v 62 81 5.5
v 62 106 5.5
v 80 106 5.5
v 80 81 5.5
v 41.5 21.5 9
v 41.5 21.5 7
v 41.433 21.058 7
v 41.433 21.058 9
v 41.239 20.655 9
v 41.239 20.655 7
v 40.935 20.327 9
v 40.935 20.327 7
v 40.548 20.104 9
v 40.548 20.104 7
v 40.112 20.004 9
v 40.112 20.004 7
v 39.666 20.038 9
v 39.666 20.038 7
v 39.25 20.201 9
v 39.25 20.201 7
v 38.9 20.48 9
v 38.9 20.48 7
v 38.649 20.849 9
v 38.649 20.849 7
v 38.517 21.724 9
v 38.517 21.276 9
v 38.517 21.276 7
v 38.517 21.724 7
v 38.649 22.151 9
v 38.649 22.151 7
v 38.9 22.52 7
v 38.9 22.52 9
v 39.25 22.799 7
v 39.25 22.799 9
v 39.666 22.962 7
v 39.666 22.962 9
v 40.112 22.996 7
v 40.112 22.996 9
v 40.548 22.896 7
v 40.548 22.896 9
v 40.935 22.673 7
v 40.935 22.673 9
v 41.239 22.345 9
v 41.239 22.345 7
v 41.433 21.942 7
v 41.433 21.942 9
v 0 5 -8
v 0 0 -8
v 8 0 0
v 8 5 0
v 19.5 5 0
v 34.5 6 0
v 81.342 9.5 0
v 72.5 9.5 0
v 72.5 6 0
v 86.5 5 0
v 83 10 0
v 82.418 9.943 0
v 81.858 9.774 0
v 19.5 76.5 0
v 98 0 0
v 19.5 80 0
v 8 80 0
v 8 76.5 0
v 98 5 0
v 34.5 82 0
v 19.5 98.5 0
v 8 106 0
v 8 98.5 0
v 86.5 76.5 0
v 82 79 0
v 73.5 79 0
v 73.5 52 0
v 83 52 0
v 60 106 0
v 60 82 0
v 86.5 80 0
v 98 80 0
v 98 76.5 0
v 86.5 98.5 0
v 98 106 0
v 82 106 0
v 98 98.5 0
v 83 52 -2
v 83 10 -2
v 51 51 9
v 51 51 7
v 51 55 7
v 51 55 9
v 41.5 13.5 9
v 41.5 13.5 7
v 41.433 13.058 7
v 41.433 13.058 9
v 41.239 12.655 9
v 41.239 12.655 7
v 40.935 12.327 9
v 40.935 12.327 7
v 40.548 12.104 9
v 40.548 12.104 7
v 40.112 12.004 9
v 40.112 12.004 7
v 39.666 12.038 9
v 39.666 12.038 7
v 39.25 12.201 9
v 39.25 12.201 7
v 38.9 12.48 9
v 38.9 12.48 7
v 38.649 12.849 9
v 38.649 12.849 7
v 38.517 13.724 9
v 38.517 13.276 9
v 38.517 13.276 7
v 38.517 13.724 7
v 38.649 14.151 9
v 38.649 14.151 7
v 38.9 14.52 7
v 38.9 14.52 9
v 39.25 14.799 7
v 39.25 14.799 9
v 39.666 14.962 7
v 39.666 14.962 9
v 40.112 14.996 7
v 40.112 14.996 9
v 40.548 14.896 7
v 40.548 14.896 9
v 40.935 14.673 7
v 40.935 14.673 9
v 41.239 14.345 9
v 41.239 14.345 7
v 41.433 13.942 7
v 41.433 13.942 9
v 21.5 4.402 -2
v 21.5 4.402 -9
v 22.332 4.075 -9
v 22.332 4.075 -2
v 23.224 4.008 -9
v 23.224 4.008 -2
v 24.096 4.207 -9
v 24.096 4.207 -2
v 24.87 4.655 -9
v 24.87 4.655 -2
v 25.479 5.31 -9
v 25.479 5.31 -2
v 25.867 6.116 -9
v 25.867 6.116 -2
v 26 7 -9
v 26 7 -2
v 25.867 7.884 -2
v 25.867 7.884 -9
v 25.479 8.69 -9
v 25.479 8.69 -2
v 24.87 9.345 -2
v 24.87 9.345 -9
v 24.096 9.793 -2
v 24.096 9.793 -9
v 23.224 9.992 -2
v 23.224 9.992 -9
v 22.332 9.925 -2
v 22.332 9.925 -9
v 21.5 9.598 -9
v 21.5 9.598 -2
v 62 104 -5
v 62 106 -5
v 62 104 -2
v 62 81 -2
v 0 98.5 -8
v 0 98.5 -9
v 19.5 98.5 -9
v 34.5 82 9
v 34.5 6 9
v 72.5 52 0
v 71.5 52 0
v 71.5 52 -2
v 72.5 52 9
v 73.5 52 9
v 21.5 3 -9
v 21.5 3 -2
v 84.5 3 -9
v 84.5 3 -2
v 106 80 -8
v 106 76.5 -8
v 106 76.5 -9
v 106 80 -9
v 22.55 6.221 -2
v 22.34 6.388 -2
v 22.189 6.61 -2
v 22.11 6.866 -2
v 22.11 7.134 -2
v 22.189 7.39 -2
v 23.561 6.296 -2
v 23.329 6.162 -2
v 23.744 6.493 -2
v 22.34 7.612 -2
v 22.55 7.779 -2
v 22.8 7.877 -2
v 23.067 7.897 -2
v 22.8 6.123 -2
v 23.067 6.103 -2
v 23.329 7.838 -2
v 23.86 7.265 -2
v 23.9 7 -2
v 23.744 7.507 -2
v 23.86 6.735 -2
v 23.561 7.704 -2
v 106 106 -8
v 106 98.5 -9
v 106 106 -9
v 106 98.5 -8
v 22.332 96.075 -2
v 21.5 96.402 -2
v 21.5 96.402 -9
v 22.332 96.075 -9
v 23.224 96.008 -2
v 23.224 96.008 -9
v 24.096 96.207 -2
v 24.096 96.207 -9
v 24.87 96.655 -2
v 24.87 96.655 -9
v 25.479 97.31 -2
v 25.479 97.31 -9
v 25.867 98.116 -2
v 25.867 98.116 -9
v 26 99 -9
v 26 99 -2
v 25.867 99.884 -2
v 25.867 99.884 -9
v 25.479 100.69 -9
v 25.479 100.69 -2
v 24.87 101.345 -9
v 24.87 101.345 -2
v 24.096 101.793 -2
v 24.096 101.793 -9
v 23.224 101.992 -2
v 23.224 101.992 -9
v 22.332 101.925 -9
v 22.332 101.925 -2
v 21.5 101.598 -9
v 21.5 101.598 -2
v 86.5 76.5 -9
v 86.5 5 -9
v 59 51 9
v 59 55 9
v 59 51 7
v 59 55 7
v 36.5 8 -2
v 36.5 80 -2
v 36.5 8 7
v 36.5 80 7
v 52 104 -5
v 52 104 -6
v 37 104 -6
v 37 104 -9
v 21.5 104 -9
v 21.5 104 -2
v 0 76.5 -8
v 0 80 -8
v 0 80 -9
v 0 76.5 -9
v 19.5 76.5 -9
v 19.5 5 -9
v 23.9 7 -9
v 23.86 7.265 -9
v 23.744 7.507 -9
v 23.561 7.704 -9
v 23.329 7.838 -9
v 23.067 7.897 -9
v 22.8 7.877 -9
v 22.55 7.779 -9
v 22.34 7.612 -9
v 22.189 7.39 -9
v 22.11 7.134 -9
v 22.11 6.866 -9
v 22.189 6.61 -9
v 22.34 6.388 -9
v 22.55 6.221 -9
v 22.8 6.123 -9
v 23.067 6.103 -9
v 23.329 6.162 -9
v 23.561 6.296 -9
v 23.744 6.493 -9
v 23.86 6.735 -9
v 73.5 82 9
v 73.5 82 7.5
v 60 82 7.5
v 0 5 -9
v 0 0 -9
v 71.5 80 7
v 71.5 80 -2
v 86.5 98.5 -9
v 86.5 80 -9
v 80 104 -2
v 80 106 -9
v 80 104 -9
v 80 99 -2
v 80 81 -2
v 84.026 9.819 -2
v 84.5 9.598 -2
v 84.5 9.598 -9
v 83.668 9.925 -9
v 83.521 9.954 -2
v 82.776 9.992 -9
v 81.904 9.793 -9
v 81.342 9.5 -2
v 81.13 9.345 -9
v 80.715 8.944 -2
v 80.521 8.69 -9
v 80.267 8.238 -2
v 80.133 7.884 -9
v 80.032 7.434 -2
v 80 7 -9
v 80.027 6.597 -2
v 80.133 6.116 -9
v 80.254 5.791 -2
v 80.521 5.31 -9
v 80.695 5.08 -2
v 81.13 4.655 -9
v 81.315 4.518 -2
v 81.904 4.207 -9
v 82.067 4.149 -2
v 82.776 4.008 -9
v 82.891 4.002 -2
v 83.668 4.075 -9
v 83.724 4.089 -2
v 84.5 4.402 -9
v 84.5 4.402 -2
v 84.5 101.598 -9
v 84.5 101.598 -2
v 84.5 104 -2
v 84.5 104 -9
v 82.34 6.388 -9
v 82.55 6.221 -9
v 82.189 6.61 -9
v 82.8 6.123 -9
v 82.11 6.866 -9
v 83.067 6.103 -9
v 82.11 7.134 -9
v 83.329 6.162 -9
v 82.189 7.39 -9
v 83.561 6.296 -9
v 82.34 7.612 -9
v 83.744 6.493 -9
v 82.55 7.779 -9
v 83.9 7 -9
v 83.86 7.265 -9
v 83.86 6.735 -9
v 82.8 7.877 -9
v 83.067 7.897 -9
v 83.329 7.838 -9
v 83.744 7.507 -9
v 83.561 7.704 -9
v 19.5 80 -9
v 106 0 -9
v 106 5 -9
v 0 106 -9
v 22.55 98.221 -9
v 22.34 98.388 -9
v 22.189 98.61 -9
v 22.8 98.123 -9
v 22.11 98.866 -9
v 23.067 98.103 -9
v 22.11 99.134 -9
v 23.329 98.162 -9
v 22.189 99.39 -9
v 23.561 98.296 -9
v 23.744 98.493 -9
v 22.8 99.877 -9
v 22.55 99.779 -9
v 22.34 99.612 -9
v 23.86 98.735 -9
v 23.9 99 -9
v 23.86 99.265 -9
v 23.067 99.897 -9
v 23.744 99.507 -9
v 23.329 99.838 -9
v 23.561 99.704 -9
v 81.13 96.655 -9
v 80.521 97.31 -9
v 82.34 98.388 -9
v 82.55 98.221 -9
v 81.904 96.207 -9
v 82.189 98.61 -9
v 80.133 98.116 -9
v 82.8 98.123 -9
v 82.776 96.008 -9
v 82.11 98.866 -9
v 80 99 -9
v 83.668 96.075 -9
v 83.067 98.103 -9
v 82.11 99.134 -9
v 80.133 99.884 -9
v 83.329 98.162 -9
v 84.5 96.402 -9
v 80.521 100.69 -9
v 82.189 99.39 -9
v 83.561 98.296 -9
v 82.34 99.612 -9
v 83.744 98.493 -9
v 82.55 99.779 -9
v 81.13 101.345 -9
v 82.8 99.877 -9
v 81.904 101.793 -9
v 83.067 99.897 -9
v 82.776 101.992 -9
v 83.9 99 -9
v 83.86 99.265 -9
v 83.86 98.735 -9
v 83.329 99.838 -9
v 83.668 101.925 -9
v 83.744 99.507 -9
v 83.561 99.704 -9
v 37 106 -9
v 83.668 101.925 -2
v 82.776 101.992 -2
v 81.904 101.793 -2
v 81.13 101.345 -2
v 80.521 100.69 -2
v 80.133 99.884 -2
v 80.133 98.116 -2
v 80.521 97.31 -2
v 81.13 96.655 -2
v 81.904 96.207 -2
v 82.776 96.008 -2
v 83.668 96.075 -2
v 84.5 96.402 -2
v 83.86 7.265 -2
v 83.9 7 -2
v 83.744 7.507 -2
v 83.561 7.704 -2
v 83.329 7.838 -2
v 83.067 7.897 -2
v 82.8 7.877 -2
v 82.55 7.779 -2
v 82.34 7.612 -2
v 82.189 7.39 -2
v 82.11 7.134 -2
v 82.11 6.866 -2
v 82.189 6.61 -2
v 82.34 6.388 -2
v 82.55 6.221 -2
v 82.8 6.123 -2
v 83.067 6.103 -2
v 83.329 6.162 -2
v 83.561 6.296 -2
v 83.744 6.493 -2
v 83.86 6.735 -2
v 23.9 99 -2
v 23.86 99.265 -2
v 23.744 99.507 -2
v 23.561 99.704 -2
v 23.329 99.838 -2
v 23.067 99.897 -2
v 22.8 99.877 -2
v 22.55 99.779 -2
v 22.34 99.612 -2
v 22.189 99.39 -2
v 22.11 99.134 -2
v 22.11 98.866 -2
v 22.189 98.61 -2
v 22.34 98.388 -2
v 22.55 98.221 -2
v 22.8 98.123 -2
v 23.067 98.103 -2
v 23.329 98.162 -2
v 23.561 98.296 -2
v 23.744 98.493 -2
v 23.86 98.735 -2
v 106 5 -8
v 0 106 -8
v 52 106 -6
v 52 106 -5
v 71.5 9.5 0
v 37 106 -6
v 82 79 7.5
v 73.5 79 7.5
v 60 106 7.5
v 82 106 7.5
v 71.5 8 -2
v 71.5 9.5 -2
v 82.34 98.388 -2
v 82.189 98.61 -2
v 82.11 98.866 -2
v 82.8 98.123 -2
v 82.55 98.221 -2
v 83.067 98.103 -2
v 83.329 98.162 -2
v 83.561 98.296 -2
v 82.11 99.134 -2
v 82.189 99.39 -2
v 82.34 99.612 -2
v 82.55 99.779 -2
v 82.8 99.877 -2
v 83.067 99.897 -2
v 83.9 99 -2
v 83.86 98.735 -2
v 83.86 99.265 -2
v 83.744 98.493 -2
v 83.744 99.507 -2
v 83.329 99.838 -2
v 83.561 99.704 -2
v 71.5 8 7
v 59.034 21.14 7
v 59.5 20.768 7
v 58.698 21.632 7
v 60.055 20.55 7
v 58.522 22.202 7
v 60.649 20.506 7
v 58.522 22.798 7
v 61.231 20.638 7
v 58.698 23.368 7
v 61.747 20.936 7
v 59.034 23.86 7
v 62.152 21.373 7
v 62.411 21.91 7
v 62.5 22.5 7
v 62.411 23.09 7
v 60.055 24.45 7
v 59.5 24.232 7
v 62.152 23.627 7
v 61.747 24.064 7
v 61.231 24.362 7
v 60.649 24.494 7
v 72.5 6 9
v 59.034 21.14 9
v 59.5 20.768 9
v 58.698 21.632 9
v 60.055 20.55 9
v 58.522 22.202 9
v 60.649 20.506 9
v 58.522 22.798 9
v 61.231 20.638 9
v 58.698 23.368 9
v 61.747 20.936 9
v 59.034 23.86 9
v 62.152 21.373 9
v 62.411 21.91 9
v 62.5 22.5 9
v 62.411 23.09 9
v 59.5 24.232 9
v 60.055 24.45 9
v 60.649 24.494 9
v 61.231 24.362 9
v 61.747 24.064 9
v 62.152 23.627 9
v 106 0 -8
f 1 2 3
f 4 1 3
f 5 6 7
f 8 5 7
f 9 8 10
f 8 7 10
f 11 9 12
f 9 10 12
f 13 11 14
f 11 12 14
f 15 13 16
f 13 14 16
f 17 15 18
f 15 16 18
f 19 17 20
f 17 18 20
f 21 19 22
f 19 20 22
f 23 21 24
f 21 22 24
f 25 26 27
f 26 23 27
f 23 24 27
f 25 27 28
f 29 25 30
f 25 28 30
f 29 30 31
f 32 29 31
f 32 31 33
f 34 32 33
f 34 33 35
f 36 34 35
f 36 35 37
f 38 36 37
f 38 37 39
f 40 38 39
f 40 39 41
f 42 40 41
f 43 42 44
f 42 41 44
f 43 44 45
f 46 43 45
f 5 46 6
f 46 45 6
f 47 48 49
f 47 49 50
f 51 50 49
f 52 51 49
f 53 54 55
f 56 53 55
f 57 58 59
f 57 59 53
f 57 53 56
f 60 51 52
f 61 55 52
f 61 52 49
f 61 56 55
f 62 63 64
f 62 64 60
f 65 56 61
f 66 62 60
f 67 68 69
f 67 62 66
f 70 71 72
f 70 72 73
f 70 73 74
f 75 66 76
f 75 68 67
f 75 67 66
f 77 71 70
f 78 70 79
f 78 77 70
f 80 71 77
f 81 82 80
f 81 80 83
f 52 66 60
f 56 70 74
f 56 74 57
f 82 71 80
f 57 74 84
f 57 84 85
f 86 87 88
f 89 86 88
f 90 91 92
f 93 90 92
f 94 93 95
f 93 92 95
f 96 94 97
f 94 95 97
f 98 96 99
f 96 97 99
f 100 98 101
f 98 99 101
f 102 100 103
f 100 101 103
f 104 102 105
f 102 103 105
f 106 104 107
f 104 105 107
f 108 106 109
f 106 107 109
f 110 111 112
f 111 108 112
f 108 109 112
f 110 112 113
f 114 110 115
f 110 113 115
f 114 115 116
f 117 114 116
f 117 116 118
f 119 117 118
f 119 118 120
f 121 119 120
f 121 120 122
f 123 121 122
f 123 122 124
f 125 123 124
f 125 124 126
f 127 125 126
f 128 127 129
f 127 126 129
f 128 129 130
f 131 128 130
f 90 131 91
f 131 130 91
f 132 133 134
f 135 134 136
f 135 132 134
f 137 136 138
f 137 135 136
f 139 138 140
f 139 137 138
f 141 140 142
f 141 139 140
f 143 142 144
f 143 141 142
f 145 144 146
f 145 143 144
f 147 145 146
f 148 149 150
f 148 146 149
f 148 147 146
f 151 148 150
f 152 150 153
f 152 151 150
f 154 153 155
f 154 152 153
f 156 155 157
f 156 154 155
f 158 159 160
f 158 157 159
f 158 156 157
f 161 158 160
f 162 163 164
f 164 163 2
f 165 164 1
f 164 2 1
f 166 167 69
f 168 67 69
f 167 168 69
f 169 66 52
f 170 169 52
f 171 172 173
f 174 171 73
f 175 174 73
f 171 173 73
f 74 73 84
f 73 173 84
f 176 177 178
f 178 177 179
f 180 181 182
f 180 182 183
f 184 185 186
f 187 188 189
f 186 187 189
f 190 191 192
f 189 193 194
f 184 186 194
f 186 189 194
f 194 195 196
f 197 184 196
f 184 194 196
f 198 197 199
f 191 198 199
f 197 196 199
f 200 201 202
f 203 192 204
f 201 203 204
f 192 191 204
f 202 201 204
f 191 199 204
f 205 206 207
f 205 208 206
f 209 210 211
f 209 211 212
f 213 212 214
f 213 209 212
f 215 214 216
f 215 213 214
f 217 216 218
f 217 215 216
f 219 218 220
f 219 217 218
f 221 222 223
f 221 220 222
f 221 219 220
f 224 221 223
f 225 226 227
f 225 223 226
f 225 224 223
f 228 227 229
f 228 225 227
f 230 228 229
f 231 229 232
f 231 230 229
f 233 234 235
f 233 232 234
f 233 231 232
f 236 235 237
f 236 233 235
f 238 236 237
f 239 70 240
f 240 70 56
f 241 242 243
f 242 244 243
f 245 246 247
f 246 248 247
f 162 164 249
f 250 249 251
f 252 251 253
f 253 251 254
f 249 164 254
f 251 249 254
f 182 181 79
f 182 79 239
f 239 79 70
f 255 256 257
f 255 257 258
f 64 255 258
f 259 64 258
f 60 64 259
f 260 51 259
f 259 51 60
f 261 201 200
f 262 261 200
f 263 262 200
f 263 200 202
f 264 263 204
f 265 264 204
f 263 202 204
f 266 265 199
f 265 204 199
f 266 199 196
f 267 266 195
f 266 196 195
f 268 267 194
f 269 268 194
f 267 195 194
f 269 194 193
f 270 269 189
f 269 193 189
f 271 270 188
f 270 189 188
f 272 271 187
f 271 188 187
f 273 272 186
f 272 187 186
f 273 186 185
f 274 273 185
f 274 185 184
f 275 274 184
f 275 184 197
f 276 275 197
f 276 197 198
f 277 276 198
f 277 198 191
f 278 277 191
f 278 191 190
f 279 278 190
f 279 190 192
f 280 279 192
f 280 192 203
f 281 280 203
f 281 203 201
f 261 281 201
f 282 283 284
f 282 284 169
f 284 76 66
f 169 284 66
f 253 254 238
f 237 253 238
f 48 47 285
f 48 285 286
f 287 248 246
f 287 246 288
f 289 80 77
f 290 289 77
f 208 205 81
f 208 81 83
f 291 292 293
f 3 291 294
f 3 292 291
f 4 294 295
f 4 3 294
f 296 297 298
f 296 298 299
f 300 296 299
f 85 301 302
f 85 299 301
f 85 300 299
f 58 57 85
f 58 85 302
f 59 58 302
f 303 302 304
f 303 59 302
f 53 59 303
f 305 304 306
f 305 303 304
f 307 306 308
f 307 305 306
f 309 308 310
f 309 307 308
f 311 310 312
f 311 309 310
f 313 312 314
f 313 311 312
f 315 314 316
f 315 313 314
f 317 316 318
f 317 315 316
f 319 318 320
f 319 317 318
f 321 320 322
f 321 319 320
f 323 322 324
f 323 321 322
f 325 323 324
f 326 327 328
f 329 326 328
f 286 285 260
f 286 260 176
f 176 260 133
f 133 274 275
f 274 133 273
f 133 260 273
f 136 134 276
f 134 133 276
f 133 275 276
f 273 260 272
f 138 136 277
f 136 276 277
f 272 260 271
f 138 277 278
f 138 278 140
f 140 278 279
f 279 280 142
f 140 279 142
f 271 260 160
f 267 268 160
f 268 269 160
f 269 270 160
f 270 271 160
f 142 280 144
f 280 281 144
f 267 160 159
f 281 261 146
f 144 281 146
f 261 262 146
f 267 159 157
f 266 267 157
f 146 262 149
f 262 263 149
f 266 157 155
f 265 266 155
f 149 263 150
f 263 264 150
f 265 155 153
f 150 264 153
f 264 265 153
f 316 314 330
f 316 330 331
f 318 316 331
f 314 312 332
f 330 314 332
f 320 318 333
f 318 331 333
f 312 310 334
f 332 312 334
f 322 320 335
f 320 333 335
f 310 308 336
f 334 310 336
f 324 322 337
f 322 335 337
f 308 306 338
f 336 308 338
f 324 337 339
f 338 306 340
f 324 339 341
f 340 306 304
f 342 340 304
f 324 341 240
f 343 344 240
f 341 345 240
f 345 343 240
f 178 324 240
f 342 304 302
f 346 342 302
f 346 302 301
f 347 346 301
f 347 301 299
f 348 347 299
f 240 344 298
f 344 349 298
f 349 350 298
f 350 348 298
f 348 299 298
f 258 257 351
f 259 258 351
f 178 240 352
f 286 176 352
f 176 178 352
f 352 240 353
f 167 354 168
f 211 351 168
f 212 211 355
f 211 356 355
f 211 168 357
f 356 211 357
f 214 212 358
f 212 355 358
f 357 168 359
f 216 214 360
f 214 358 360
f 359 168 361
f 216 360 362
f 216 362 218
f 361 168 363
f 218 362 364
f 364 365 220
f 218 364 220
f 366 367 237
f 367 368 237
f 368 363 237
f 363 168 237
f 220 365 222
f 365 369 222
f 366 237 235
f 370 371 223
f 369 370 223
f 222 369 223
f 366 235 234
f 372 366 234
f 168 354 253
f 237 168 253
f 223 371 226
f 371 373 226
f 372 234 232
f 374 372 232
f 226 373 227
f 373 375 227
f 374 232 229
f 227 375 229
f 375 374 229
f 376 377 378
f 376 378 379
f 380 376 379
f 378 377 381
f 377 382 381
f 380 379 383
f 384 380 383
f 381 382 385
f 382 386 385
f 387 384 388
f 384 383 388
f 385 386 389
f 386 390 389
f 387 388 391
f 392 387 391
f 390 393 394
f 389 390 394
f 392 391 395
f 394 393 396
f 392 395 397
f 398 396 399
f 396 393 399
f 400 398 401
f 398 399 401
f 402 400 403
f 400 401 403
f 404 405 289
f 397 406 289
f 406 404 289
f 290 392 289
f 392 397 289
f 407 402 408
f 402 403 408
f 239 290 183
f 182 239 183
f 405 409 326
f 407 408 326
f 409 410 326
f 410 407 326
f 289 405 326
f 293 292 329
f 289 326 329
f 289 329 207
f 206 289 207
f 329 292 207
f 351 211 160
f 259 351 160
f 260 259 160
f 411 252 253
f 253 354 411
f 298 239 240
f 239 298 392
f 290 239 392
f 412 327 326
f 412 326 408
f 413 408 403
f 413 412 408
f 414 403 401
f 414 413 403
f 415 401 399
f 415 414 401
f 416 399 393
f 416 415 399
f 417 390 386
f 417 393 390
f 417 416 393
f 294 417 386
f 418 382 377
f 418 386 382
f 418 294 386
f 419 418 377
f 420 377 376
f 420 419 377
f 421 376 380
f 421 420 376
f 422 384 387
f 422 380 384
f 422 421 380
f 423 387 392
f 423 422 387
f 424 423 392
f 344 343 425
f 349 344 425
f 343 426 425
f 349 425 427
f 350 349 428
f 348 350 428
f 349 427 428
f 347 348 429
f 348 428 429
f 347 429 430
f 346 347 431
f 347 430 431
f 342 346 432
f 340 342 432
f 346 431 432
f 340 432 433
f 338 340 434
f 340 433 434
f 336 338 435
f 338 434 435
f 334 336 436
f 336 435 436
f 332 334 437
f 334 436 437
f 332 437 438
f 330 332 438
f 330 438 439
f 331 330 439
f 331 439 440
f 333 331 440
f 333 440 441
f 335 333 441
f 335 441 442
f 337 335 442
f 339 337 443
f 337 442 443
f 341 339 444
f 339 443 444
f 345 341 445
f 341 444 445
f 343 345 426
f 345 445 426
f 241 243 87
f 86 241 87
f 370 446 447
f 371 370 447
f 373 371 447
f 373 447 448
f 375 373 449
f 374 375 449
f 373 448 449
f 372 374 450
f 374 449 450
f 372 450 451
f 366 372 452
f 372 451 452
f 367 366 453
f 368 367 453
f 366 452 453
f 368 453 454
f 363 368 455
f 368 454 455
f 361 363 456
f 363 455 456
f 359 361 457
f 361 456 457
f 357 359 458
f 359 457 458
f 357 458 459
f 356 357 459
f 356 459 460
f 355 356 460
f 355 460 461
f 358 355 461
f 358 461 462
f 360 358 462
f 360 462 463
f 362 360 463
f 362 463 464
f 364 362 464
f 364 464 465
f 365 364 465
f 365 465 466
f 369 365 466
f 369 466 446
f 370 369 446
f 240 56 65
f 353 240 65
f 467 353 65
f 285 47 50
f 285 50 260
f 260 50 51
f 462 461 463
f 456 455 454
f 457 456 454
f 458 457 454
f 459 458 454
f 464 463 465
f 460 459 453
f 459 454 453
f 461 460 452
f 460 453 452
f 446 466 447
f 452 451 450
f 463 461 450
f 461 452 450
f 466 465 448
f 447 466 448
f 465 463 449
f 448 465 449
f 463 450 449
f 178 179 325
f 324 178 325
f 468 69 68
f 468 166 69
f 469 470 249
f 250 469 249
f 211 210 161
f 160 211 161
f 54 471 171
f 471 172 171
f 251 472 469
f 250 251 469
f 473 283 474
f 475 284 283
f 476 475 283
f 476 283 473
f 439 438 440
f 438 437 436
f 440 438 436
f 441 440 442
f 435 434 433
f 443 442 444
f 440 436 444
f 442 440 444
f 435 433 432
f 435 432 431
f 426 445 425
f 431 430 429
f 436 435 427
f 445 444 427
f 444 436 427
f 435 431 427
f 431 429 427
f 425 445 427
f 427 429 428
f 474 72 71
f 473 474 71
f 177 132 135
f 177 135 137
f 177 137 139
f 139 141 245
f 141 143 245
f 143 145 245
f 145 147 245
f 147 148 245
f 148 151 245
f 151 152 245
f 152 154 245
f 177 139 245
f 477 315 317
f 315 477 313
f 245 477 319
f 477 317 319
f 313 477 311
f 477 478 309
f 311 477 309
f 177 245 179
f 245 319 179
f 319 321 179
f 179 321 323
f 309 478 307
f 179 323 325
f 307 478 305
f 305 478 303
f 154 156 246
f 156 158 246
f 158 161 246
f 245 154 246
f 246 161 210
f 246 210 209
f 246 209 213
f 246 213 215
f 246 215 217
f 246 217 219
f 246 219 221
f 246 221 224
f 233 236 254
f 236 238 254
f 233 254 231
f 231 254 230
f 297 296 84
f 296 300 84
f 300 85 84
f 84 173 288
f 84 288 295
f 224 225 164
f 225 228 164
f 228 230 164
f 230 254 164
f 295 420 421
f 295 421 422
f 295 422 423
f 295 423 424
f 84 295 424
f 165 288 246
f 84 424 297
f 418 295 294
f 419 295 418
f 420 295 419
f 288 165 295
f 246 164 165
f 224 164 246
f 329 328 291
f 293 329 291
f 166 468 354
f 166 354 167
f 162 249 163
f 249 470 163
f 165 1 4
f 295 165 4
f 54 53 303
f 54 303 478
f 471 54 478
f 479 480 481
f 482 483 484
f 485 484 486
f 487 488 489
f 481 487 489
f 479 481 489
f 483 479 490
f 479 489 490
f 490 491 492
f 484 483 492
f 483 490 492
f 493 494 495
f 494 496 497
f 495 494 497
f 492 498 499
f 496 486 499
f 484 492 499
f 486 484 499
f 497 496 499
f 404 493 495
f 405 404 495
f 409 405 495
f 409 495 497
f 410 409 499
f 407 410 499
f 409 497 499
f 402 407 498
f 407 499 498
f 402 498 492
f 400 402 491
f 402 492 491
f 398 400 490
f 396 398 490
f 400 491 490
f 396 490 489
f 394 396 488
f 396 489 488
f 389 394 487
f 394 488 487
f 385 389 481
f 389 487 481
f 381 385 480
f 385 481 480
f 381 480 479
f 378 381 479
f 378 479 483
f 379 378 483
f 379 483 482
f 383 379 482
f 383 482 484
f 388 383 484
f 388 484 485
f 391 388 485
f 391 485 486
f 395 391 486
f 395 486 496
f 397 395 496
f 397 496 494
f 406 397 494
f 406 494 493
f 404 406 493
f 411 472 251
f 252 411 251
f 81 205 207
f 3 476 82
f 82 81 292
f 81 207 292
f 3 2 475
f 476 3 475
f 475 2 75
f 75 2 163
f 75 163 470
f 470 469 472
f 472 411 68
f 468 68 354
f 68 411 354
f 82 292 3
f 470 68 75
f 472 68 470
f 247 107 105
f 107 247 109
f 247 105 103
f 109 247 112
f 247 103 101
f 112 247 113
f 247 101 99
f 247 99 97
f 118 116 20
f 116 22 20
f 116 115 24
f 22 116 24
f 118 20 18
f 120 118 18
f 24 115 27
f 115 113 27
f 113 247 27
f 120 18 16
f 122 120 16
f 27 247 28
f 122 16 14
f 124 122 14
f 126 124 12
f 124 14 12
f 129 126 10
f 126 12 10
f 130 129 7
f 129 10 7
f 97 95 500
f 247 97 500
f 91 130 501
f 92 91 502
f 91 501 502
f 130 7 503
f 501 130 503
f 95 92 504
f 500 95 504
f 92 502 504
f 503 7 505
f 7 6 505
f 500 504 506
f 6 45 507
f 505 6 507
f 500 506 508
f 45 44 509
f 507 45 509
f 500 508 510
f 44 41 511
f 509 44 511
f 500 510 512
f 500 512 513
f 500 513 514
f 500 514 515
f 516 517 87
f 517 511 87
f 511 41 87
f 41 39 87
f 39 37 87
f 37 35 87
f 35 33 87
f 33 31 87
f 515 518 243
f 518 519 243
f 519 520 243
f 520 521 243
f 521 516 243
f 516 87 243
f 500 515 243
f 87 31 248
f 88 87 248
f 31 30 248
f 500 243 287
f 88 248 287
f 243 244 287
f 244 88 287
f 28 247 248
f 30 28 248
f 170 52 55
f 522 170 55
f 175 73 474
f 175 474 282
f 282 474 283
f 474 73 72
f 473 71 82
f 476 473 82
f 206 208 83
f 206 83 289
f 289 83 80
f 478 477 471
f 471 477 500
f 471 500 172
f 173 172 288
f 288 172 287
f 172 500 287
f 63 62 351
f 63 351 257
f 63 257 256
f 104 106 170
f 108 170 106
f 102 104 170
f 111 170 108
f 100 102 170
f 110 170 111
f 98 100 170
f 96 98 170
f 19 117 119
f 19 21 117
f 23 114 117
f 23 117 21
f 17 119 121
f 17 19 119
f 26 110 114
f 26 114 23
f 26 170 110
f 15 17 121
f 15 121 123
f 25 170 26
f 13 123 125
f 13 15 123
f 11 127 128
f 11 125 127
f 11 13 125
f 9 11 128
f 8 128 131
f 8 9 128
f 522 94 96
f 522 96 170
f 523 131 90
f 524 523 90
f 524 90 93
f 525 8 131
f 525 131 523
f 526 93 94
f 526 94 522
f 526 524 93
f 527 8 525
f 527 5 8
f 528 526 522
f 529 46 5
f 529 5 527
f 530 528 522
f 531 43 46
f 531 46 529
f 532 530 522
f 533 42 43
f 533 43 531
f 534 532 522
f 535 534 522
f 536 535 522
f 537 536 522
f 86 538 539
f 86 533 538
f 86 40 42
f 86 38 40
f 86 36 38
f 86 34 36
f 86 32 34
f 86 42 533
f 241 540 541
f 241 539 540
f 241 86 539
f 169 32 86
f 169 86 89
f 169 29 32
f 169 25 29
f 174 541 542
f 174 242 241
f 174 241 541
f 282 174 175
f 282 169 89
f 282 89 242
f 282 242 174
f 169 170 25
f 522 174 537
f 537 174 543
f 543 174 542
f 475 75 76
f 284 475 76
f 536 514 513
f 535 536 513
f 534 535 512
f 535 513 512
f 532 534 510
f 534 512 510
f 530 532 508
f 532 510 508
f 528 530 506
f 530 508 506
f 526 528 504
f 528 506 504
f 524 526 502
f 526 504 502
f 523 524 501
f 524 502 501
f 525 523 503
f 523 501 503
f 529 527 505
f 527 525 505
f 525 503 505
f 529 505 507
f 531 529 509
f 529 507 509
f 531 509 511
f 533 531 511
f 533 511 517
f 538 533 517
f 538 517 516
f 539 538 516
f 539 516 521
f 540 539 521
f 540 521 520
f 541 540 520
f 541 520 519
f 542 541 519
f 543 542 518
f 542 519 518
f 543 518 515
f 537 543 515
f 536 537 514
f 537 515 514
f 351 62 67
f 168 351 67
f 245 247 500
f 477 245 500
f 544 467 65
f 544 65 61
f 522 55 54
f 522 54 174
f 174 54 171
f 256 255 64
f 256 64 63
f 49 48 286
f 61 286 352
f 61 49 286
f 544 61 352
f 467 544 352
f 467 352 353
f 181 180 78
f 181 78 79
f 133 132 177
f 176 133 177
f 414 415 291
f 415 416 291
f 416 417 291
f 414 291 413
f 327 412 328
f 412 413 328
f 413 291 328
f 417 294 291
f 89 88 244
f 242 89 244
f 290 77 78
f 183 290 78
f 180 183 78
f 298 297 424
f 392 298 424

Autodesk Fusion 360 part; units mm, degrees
sketch "Base Sketch" plane through (0, 0, 0) normal (0, 0, 1) x (1, 0, 0)
  line L0 (0, 0) -> (106, 0)
  line L1 (106, 0) -> (106, 106)
  line L2 (106, 106) -> (0, 106)
  line L3 (0, 106) -> (0, 0)
  line L4 (19.5, 106) -> (86.5, 106)
  line L5 (86.5, 106) -> (86.5, 0)
  line L6 (86.5, 0) -> (19.5, 0)
  line L7 (19.5, 0) -> (19.5, 106)
  line L8 (21.5, 3) -> (84.5, 3)
  line L9 (84.5, 3) -> (84.5, 104)
  line L10 (84.5, 104) -> (21.5, 104)
  line L11 (21.5, 104) -> (21.5, 3)
  circle A0 centre (23, 7) radius 3
  circle A1 centre (23, 7) radius 0.9
  circle A2 centre (83, 7) radius 0.9
  circle A3 centre (83, 7) radius 3
  circle A4 centre (83, 99) radius 0.9
  circle A5 centre (83, 99) radius 3
  circle A6 centre (23, 99) radius 0.9
  circle A7 centre (23, 99) radius 3
  line L12 (80, 106) -> (80, 104)
  line L13 (52, 106) -> (52, 104)
  line L14 (37, 106) -> (37, 104)
  line L15 (86.5, 5) -> (106, 5)
  line L16 (106, 5) -> (106, 0)
  line L17 (106, 0) -> (86.5, 0)
  line L18 (86.5, 0) -> (86.5, 5)
  line L19 (0, 5) -> (19.5, 5)
  line L20 (19.5, 5) -> (19.5, 0)
  line L21 (19.5, 0) -> (0, 0)
  line L22 (0, 0) -> (0, 5)
  line L23 (86.5, 106) -> (106, 106)
  line L24 (106, 106) -> (106, 98.5)
  line L25 (106, 98.5) -> (86.5, 98.5)
  line L26 (86.5, 98.5) -> (86.5, 106)
  line L27 (0, 106) -> (19.5, 106)
  line L28 (19.5, 106) -> (19.5, 98.5)
  line L29 (19.5, 98.5) -> (0, 98.5)
  line L30 (0, 98.5) -> (0, 106)
  line L31 (106, 76.5) -> (86.5, 76.5)
  line L32 (86.5, 76.5) -> (86.5, 80)
  line L33 (86.5, 80) -> (106, 80)
  line L34 (106, 80) -> (106, 76.5)
  line L35 (0, 76.5) -> (19.5, 76.5)
  line L36 (19.5, 76.5) -> (19.5, 80)
  line L37 (19.5, 80) -> (0, 80)
  line L38 (0, 80) -> (0, 76.5)
  line L39 (63.5, 104) -> (80, 104)
  line L40 (80, 104) -> (80, 81)
  line L41 (36.5, 8) -> (71.5, 8)
  line L42 (71.5, 52) -> (83, 52)
  line L43 (83, 52) -> (83, 9.5)
  line L44 (83, 9.5) -> (71.5, 9.5)
  line L45 (71.5, 9.5) -> (71.5, 52)
  line L46 (62, 106) -> (62, 104)
  line L47 (62, 104) -> (62, 81)
  line L48 (36.5, 80) -> (71.5, 80)
  line L49 (36.5, 80) -> (36.5, 8)
  line L50 (71.5, 8) -> (71.5, 80)
  line L51 (62, 81) -> (80, 81)
  line L52 (36.5, 80) -> (62, 80)
  line L53 (62, 80) -> (62, 82)
  line L54 (62, 82) -> (36.5, 82)
  line L55 (36.5, 82) -> (36.5, 80)
  line L56 (62, 106) -> (60, 106)
  line L57 (60, 106) -> (60, 82)
  line L58 (60, 82) -> (62, 82)
  line L59 (62, 82) -> (62, 106)
  line L60 (80, 81) -> (82, 81)
  line L61 (82, 81) -> (82, 106)
  line L62 (82, 106) -> (80, 106)
  line L63 (80, 106) -> (80, 81)
  line L64 (82, 81) -> (71.5, 81)
  line L65 (71.5, 81) -> (71.5, 79)
  line L66 (71.5, 79) -> (82, 79)
  line L67 (82, 79) -> (82, 81)
  line L68 (71.5, 79) -> (73.5, 79)
  line L69 (73.5, 79) -> (73.5, 52)
  line L70 (73.5, 52) -> (71.5, 52)
  line L71 (71.5, 52) -> (71.5, 79)
  line L72 (36.5, 82) -> (34.5, 82)
  line L73 (34.5, 82) -> (34.5, 6)
  line L74 (34.5, 6) -> (36.5, 6)
  line L75 (36.5, 6) -> (36.5, 82)
  line L76 (36.5, 6) -> (71.5, 6)
  line L77 (71.5, 6) -> (71.5, 8)
  line L78 (71.5, 8) -> (36.5, 8)
  line L79 (36.5, 8) -> (36.5, 6)
  line L80 (71.5, 6) -> (72.5, 6)
  line L81 (72.5, 6) -> (72.5, 52)
  line L82 (72.5, 52) -> (71.5, 52)
  line L83 (71.5, 52) -> (71.5, 6)
  line L84 (62, 81) -> (73.5, 81)
  line L85 (73.5, 81) -> (73.5, 82)
  line L86 (73.5, 82) -> (62, 82)
  line L87 (62, 82) -> (62, 81)
  line L88 (73.5, 81) -> (73.5, 79)
  line L89 (51, 55) -> (59, 55)
  line L90 (59, 55) -> (59, 51)
  line L91 (59, 51) -> (51, 51)
  line L92 (51, 51) -> (51, 55)
  circle A8 centre (60.5, 22.5) radius 2
  circle A9 centre (40, 21.5) radius 1.5
  circle A10 centre (40, 13.5) radius 1.5
  dimension "d1" = 106
  dimension "d2" = 106
  dimension "d4" = 67
  dimension "d5" = 19.5
  dimension "d6" = 63
  dimension "d8" = 2
  dimension "d9" = 3
  dimension "d10" = 6
  dimension "d12" = 6
  dimension "d13" = 6
  dimension "d14" = 6
  dimension "d15" = 23
  dimension "d16" = 23
  dimension "d17" = 23
  dimension "d18" = 23
  dimension "d19" = 7
  dimension "d20" = 7
  dimension "d21" = 7
  dimension "d22" = 7
  dimension "d24" = 2
  dimension "d25" = 6.5
  dimension "d28" = 15
  dimension "d35" = 5
  dimension "d36" = 5
  dimension "d37" = 7.5
  dimension "d38" = 7.5
  dimension "d39" = 3.5
  dimension "d40" = 26
  dimension "d41" = 3.5
  dimension "d42" = 26
  dimension "d45" = 8
  dimension "d48" = 42.5
  dimension "d49" = 9.5
  dimension "d60" = 10
  dimension "d62" = 18
  dimension "d63" = 1.8
  dimension "d64" = 1.8
  dimension "d65" = 1.8
  dimension "d66" = 1.8
  dimension "d68" = 72
  dimension "d69" = 25
  dimension "d70" = 35
  dimension "d71" = 2
  dimension "d72" = 2
  dimension "d73" = 2
  dimension "d74" = 2
  dimension "d75" = 2
  dimension "d76" = 11.5
  dimension "d77" = 2
  dimension "d78" = 2
  dimension "d87" = 1
  dimension "d88" = 25.5
  dimension "d89" = 44
  dimension "d90" = 36.5
  dimension "d94" = 1
  dimension "d95" = 11.5
  dimension "d96" = 8
  dimension "d97" = 4
  dimension "d98" = 25
  dimension "d99" = 14.5
  dimension "d100" = 4
  dimension "d101" = 3
  dimension "d102" = 3
  dimension "d103" = 5.5
  dimension "d104" = 13.5
  dimension "d105" = 3.5
  dimension "d106" = 3.5
  dimension "d107" = 14.5
  dimension "d108" = 24
extrude "Extrude1" add sketch "Base Sketch" against normal blind 9 contours L0 L3 L7 L19 L20 L21 L22 | L0 L2 L4 L5 L6 L7 L8 L9 L10 L11 A0 A3 A5 A7 L14 L18 L20 L26 L28 L32 L36 L61 | L0 L1 L5 L15 L16 L17 L18 | L3 L7 L35 L36 L37 L38 | L1 L5 L31 L32 L33 L34 | L2 L3 L7 L27 L28 L29 L30 | L1 L2 L5 L23 L24 L25 L26 | L2 L4 L10 L12 L61 L62 L63 | A5 L61 | L9 A5 L61 | L11 A7 | L11 A7 | L9 A5 | L11 A0 | L11 A0 | L9 A3 | L9 A3 L43 L44 | A3 L43 L44 makes body 1
extrude "Extrude2" add sketch "Base Sketch" against normal blind 6 contours L2 L4 L10 L13 L14 bodies 1
extrude "Extrude3" add sketch "Base Sketch" against normal blind 5 contours L2 L4 L10 L13 L57 | L2 L4 L10 L46 L56 L57 L59 bodies 1
extrude "Extrude4" add sketch "Base Sketch" against normal blind 2 separate body contours L0 L2 L4 L5 L6 L7 L8 L9 L10 L11 A0 A3 A5 A7 L14 L18 L20 L26 L28 L32 L36 L61 | L2 L4 L10 L13 L14 | L2 L4 L10 L12 L61 L62 L63 | L2 L4 L10 L13 L57 | L8 L9 L10 L11 A0 A3 A7 L44 L54 L57 L72 L73 L74 L76 L80 L81 | L10 A5 L40 L61 L63 | L9 L10 A5 L61 | L2 L4 L10 L46 L56 L57 L59 | A5 L61 | L9 A5 L61 | L10 L47 L54 L57 L58 L59 | L11 A7 | L11 A7 | A5 L40 L60 L61 L63 L64 | L9 A5 | L9 A3 A5 L42 L43 L61 L66 L67 L69 | L47 L48 L52 L53 L54 L55 L58 L75 L87 | L51 L60 L64 L66 L67 L88 | L49 L55 L72 L73 L74 L75 L79 | L11 A0 | L11 A0 | L48 L51 L53 L65 L84 | L50 L51 L64 L65 L66 L68 L84 L88 | L9 A3 | L9 A3 L43 L44 | L42 L50 L66 L68 L69 L70 L71 L82 | A3 L43 L44 | L41 L75 L76 L77 L78 L79 L83 | L44 L50 L77 L80 L81 L83 | A1 | A2 | A4 | A6 makes body 2
chamfer "Chamfer1" distance 8 angle 45 1 edges at (106, 102.25, 0) on bodies 1
chamfer "Chamfer2" distance 8 angle 45 1 edges at (106, 78.25, 0) on bodies 1
chamfer "Chamfer3" distance 8 angle 45 1 edges at (106, 2.5, 0) on bodies 1
chamfer "Chamfer4" distance 8 angle 45 1 edges at (0, 102.25, 0) on bodies 1
chamfer "Chamfer5" distance 8 angle 45 1 edges at (0, 78.25, 0) on bodies 1
chamfer "Chamfer6" distance 8 angle 45 1 edges at (0, 2.5, 0) on bodies 1
extrude "Extrude5" add sketch "Base Sketch" along normal blind 7 contours L47 L48 L52 L53 L54 L55 L58 L75 L87 | L49 L55 L72 L73 L74 L75 L79 | L48 L51 L53 L65 L84 | L50 L51 L64 L65 L66 L68 L84 L88 | L42 L50 L66 L68 L69 L70 L71 L82 | L41 L75 L76 L77 L78 L79 L83 | L44 L50 L77 L80 L81 L83 | L42 L44 L45 L50 L70 L81 L82 L83 bodies 2
extrude "Extrude6" add sketch "Base Sketch" along normal blind 2 from surface at 7 separate body contours L47 L48 L52 L53 L54 L55 L58 L75 L87 | L49 L55 L72 L73 L74 L75 L79 | L48 L51 L53 L65 L84 | L50 L51 L64 L65 L66 L68 L84 L88 | L41 L45 L48 L49 L50 L52 L65 L71 L75 L78 L83 | L42 L50 L66 L68 L69 L70 L71 L82 | L41 L75 L76 L77 L78 L79 L83 | L44 L50 L77 L80 L81 L83 | L42 L44 L45 L50 L70 L81 L82 L83 makes body 3
extrude "Extrude7" add sketch "Base Sketch" along normal blind 5.5 contours L2 L4 L10 L12 L61 L62 L63 | L10 A5 L40 L61 L63 | L2 L4 L10 L46 L56 L57 L59 | A5 L61 | L10 L47 L54 L57 L58 L59 | A5 L40 L60 L61 L63 L64 | L51 L60 L64 L66 L67 L88 bodies 2 1
extrude "Extrude8" add sketch "Base Sketch" along normal blind 2 from surface at 5.5 separate body contours L2 L4 L10 L12 L61 L62 L63 | L2 L4 L10 L12 L39 L46 L59 L63 | L10 A5 L40 L61 L63 | L2 L4 L10 L46 L56 L57 L59 | L10 L39 L40 L47 L51 L59 L63 L64 L85 L86 | A5 L61 | L10 L47 L54 L57 L58 L59 | A5 L40 L60 L61 L63 L64 | L51 L60 L64 L66 L67 L88 makes body 4
extrude "Extrude9" add sketch "Base Sketch" along normal blind 3.5 from surface at 5.5 contours L47 L51 L53 L64 L84 L85 L86 L87 bodies 2 3 4
